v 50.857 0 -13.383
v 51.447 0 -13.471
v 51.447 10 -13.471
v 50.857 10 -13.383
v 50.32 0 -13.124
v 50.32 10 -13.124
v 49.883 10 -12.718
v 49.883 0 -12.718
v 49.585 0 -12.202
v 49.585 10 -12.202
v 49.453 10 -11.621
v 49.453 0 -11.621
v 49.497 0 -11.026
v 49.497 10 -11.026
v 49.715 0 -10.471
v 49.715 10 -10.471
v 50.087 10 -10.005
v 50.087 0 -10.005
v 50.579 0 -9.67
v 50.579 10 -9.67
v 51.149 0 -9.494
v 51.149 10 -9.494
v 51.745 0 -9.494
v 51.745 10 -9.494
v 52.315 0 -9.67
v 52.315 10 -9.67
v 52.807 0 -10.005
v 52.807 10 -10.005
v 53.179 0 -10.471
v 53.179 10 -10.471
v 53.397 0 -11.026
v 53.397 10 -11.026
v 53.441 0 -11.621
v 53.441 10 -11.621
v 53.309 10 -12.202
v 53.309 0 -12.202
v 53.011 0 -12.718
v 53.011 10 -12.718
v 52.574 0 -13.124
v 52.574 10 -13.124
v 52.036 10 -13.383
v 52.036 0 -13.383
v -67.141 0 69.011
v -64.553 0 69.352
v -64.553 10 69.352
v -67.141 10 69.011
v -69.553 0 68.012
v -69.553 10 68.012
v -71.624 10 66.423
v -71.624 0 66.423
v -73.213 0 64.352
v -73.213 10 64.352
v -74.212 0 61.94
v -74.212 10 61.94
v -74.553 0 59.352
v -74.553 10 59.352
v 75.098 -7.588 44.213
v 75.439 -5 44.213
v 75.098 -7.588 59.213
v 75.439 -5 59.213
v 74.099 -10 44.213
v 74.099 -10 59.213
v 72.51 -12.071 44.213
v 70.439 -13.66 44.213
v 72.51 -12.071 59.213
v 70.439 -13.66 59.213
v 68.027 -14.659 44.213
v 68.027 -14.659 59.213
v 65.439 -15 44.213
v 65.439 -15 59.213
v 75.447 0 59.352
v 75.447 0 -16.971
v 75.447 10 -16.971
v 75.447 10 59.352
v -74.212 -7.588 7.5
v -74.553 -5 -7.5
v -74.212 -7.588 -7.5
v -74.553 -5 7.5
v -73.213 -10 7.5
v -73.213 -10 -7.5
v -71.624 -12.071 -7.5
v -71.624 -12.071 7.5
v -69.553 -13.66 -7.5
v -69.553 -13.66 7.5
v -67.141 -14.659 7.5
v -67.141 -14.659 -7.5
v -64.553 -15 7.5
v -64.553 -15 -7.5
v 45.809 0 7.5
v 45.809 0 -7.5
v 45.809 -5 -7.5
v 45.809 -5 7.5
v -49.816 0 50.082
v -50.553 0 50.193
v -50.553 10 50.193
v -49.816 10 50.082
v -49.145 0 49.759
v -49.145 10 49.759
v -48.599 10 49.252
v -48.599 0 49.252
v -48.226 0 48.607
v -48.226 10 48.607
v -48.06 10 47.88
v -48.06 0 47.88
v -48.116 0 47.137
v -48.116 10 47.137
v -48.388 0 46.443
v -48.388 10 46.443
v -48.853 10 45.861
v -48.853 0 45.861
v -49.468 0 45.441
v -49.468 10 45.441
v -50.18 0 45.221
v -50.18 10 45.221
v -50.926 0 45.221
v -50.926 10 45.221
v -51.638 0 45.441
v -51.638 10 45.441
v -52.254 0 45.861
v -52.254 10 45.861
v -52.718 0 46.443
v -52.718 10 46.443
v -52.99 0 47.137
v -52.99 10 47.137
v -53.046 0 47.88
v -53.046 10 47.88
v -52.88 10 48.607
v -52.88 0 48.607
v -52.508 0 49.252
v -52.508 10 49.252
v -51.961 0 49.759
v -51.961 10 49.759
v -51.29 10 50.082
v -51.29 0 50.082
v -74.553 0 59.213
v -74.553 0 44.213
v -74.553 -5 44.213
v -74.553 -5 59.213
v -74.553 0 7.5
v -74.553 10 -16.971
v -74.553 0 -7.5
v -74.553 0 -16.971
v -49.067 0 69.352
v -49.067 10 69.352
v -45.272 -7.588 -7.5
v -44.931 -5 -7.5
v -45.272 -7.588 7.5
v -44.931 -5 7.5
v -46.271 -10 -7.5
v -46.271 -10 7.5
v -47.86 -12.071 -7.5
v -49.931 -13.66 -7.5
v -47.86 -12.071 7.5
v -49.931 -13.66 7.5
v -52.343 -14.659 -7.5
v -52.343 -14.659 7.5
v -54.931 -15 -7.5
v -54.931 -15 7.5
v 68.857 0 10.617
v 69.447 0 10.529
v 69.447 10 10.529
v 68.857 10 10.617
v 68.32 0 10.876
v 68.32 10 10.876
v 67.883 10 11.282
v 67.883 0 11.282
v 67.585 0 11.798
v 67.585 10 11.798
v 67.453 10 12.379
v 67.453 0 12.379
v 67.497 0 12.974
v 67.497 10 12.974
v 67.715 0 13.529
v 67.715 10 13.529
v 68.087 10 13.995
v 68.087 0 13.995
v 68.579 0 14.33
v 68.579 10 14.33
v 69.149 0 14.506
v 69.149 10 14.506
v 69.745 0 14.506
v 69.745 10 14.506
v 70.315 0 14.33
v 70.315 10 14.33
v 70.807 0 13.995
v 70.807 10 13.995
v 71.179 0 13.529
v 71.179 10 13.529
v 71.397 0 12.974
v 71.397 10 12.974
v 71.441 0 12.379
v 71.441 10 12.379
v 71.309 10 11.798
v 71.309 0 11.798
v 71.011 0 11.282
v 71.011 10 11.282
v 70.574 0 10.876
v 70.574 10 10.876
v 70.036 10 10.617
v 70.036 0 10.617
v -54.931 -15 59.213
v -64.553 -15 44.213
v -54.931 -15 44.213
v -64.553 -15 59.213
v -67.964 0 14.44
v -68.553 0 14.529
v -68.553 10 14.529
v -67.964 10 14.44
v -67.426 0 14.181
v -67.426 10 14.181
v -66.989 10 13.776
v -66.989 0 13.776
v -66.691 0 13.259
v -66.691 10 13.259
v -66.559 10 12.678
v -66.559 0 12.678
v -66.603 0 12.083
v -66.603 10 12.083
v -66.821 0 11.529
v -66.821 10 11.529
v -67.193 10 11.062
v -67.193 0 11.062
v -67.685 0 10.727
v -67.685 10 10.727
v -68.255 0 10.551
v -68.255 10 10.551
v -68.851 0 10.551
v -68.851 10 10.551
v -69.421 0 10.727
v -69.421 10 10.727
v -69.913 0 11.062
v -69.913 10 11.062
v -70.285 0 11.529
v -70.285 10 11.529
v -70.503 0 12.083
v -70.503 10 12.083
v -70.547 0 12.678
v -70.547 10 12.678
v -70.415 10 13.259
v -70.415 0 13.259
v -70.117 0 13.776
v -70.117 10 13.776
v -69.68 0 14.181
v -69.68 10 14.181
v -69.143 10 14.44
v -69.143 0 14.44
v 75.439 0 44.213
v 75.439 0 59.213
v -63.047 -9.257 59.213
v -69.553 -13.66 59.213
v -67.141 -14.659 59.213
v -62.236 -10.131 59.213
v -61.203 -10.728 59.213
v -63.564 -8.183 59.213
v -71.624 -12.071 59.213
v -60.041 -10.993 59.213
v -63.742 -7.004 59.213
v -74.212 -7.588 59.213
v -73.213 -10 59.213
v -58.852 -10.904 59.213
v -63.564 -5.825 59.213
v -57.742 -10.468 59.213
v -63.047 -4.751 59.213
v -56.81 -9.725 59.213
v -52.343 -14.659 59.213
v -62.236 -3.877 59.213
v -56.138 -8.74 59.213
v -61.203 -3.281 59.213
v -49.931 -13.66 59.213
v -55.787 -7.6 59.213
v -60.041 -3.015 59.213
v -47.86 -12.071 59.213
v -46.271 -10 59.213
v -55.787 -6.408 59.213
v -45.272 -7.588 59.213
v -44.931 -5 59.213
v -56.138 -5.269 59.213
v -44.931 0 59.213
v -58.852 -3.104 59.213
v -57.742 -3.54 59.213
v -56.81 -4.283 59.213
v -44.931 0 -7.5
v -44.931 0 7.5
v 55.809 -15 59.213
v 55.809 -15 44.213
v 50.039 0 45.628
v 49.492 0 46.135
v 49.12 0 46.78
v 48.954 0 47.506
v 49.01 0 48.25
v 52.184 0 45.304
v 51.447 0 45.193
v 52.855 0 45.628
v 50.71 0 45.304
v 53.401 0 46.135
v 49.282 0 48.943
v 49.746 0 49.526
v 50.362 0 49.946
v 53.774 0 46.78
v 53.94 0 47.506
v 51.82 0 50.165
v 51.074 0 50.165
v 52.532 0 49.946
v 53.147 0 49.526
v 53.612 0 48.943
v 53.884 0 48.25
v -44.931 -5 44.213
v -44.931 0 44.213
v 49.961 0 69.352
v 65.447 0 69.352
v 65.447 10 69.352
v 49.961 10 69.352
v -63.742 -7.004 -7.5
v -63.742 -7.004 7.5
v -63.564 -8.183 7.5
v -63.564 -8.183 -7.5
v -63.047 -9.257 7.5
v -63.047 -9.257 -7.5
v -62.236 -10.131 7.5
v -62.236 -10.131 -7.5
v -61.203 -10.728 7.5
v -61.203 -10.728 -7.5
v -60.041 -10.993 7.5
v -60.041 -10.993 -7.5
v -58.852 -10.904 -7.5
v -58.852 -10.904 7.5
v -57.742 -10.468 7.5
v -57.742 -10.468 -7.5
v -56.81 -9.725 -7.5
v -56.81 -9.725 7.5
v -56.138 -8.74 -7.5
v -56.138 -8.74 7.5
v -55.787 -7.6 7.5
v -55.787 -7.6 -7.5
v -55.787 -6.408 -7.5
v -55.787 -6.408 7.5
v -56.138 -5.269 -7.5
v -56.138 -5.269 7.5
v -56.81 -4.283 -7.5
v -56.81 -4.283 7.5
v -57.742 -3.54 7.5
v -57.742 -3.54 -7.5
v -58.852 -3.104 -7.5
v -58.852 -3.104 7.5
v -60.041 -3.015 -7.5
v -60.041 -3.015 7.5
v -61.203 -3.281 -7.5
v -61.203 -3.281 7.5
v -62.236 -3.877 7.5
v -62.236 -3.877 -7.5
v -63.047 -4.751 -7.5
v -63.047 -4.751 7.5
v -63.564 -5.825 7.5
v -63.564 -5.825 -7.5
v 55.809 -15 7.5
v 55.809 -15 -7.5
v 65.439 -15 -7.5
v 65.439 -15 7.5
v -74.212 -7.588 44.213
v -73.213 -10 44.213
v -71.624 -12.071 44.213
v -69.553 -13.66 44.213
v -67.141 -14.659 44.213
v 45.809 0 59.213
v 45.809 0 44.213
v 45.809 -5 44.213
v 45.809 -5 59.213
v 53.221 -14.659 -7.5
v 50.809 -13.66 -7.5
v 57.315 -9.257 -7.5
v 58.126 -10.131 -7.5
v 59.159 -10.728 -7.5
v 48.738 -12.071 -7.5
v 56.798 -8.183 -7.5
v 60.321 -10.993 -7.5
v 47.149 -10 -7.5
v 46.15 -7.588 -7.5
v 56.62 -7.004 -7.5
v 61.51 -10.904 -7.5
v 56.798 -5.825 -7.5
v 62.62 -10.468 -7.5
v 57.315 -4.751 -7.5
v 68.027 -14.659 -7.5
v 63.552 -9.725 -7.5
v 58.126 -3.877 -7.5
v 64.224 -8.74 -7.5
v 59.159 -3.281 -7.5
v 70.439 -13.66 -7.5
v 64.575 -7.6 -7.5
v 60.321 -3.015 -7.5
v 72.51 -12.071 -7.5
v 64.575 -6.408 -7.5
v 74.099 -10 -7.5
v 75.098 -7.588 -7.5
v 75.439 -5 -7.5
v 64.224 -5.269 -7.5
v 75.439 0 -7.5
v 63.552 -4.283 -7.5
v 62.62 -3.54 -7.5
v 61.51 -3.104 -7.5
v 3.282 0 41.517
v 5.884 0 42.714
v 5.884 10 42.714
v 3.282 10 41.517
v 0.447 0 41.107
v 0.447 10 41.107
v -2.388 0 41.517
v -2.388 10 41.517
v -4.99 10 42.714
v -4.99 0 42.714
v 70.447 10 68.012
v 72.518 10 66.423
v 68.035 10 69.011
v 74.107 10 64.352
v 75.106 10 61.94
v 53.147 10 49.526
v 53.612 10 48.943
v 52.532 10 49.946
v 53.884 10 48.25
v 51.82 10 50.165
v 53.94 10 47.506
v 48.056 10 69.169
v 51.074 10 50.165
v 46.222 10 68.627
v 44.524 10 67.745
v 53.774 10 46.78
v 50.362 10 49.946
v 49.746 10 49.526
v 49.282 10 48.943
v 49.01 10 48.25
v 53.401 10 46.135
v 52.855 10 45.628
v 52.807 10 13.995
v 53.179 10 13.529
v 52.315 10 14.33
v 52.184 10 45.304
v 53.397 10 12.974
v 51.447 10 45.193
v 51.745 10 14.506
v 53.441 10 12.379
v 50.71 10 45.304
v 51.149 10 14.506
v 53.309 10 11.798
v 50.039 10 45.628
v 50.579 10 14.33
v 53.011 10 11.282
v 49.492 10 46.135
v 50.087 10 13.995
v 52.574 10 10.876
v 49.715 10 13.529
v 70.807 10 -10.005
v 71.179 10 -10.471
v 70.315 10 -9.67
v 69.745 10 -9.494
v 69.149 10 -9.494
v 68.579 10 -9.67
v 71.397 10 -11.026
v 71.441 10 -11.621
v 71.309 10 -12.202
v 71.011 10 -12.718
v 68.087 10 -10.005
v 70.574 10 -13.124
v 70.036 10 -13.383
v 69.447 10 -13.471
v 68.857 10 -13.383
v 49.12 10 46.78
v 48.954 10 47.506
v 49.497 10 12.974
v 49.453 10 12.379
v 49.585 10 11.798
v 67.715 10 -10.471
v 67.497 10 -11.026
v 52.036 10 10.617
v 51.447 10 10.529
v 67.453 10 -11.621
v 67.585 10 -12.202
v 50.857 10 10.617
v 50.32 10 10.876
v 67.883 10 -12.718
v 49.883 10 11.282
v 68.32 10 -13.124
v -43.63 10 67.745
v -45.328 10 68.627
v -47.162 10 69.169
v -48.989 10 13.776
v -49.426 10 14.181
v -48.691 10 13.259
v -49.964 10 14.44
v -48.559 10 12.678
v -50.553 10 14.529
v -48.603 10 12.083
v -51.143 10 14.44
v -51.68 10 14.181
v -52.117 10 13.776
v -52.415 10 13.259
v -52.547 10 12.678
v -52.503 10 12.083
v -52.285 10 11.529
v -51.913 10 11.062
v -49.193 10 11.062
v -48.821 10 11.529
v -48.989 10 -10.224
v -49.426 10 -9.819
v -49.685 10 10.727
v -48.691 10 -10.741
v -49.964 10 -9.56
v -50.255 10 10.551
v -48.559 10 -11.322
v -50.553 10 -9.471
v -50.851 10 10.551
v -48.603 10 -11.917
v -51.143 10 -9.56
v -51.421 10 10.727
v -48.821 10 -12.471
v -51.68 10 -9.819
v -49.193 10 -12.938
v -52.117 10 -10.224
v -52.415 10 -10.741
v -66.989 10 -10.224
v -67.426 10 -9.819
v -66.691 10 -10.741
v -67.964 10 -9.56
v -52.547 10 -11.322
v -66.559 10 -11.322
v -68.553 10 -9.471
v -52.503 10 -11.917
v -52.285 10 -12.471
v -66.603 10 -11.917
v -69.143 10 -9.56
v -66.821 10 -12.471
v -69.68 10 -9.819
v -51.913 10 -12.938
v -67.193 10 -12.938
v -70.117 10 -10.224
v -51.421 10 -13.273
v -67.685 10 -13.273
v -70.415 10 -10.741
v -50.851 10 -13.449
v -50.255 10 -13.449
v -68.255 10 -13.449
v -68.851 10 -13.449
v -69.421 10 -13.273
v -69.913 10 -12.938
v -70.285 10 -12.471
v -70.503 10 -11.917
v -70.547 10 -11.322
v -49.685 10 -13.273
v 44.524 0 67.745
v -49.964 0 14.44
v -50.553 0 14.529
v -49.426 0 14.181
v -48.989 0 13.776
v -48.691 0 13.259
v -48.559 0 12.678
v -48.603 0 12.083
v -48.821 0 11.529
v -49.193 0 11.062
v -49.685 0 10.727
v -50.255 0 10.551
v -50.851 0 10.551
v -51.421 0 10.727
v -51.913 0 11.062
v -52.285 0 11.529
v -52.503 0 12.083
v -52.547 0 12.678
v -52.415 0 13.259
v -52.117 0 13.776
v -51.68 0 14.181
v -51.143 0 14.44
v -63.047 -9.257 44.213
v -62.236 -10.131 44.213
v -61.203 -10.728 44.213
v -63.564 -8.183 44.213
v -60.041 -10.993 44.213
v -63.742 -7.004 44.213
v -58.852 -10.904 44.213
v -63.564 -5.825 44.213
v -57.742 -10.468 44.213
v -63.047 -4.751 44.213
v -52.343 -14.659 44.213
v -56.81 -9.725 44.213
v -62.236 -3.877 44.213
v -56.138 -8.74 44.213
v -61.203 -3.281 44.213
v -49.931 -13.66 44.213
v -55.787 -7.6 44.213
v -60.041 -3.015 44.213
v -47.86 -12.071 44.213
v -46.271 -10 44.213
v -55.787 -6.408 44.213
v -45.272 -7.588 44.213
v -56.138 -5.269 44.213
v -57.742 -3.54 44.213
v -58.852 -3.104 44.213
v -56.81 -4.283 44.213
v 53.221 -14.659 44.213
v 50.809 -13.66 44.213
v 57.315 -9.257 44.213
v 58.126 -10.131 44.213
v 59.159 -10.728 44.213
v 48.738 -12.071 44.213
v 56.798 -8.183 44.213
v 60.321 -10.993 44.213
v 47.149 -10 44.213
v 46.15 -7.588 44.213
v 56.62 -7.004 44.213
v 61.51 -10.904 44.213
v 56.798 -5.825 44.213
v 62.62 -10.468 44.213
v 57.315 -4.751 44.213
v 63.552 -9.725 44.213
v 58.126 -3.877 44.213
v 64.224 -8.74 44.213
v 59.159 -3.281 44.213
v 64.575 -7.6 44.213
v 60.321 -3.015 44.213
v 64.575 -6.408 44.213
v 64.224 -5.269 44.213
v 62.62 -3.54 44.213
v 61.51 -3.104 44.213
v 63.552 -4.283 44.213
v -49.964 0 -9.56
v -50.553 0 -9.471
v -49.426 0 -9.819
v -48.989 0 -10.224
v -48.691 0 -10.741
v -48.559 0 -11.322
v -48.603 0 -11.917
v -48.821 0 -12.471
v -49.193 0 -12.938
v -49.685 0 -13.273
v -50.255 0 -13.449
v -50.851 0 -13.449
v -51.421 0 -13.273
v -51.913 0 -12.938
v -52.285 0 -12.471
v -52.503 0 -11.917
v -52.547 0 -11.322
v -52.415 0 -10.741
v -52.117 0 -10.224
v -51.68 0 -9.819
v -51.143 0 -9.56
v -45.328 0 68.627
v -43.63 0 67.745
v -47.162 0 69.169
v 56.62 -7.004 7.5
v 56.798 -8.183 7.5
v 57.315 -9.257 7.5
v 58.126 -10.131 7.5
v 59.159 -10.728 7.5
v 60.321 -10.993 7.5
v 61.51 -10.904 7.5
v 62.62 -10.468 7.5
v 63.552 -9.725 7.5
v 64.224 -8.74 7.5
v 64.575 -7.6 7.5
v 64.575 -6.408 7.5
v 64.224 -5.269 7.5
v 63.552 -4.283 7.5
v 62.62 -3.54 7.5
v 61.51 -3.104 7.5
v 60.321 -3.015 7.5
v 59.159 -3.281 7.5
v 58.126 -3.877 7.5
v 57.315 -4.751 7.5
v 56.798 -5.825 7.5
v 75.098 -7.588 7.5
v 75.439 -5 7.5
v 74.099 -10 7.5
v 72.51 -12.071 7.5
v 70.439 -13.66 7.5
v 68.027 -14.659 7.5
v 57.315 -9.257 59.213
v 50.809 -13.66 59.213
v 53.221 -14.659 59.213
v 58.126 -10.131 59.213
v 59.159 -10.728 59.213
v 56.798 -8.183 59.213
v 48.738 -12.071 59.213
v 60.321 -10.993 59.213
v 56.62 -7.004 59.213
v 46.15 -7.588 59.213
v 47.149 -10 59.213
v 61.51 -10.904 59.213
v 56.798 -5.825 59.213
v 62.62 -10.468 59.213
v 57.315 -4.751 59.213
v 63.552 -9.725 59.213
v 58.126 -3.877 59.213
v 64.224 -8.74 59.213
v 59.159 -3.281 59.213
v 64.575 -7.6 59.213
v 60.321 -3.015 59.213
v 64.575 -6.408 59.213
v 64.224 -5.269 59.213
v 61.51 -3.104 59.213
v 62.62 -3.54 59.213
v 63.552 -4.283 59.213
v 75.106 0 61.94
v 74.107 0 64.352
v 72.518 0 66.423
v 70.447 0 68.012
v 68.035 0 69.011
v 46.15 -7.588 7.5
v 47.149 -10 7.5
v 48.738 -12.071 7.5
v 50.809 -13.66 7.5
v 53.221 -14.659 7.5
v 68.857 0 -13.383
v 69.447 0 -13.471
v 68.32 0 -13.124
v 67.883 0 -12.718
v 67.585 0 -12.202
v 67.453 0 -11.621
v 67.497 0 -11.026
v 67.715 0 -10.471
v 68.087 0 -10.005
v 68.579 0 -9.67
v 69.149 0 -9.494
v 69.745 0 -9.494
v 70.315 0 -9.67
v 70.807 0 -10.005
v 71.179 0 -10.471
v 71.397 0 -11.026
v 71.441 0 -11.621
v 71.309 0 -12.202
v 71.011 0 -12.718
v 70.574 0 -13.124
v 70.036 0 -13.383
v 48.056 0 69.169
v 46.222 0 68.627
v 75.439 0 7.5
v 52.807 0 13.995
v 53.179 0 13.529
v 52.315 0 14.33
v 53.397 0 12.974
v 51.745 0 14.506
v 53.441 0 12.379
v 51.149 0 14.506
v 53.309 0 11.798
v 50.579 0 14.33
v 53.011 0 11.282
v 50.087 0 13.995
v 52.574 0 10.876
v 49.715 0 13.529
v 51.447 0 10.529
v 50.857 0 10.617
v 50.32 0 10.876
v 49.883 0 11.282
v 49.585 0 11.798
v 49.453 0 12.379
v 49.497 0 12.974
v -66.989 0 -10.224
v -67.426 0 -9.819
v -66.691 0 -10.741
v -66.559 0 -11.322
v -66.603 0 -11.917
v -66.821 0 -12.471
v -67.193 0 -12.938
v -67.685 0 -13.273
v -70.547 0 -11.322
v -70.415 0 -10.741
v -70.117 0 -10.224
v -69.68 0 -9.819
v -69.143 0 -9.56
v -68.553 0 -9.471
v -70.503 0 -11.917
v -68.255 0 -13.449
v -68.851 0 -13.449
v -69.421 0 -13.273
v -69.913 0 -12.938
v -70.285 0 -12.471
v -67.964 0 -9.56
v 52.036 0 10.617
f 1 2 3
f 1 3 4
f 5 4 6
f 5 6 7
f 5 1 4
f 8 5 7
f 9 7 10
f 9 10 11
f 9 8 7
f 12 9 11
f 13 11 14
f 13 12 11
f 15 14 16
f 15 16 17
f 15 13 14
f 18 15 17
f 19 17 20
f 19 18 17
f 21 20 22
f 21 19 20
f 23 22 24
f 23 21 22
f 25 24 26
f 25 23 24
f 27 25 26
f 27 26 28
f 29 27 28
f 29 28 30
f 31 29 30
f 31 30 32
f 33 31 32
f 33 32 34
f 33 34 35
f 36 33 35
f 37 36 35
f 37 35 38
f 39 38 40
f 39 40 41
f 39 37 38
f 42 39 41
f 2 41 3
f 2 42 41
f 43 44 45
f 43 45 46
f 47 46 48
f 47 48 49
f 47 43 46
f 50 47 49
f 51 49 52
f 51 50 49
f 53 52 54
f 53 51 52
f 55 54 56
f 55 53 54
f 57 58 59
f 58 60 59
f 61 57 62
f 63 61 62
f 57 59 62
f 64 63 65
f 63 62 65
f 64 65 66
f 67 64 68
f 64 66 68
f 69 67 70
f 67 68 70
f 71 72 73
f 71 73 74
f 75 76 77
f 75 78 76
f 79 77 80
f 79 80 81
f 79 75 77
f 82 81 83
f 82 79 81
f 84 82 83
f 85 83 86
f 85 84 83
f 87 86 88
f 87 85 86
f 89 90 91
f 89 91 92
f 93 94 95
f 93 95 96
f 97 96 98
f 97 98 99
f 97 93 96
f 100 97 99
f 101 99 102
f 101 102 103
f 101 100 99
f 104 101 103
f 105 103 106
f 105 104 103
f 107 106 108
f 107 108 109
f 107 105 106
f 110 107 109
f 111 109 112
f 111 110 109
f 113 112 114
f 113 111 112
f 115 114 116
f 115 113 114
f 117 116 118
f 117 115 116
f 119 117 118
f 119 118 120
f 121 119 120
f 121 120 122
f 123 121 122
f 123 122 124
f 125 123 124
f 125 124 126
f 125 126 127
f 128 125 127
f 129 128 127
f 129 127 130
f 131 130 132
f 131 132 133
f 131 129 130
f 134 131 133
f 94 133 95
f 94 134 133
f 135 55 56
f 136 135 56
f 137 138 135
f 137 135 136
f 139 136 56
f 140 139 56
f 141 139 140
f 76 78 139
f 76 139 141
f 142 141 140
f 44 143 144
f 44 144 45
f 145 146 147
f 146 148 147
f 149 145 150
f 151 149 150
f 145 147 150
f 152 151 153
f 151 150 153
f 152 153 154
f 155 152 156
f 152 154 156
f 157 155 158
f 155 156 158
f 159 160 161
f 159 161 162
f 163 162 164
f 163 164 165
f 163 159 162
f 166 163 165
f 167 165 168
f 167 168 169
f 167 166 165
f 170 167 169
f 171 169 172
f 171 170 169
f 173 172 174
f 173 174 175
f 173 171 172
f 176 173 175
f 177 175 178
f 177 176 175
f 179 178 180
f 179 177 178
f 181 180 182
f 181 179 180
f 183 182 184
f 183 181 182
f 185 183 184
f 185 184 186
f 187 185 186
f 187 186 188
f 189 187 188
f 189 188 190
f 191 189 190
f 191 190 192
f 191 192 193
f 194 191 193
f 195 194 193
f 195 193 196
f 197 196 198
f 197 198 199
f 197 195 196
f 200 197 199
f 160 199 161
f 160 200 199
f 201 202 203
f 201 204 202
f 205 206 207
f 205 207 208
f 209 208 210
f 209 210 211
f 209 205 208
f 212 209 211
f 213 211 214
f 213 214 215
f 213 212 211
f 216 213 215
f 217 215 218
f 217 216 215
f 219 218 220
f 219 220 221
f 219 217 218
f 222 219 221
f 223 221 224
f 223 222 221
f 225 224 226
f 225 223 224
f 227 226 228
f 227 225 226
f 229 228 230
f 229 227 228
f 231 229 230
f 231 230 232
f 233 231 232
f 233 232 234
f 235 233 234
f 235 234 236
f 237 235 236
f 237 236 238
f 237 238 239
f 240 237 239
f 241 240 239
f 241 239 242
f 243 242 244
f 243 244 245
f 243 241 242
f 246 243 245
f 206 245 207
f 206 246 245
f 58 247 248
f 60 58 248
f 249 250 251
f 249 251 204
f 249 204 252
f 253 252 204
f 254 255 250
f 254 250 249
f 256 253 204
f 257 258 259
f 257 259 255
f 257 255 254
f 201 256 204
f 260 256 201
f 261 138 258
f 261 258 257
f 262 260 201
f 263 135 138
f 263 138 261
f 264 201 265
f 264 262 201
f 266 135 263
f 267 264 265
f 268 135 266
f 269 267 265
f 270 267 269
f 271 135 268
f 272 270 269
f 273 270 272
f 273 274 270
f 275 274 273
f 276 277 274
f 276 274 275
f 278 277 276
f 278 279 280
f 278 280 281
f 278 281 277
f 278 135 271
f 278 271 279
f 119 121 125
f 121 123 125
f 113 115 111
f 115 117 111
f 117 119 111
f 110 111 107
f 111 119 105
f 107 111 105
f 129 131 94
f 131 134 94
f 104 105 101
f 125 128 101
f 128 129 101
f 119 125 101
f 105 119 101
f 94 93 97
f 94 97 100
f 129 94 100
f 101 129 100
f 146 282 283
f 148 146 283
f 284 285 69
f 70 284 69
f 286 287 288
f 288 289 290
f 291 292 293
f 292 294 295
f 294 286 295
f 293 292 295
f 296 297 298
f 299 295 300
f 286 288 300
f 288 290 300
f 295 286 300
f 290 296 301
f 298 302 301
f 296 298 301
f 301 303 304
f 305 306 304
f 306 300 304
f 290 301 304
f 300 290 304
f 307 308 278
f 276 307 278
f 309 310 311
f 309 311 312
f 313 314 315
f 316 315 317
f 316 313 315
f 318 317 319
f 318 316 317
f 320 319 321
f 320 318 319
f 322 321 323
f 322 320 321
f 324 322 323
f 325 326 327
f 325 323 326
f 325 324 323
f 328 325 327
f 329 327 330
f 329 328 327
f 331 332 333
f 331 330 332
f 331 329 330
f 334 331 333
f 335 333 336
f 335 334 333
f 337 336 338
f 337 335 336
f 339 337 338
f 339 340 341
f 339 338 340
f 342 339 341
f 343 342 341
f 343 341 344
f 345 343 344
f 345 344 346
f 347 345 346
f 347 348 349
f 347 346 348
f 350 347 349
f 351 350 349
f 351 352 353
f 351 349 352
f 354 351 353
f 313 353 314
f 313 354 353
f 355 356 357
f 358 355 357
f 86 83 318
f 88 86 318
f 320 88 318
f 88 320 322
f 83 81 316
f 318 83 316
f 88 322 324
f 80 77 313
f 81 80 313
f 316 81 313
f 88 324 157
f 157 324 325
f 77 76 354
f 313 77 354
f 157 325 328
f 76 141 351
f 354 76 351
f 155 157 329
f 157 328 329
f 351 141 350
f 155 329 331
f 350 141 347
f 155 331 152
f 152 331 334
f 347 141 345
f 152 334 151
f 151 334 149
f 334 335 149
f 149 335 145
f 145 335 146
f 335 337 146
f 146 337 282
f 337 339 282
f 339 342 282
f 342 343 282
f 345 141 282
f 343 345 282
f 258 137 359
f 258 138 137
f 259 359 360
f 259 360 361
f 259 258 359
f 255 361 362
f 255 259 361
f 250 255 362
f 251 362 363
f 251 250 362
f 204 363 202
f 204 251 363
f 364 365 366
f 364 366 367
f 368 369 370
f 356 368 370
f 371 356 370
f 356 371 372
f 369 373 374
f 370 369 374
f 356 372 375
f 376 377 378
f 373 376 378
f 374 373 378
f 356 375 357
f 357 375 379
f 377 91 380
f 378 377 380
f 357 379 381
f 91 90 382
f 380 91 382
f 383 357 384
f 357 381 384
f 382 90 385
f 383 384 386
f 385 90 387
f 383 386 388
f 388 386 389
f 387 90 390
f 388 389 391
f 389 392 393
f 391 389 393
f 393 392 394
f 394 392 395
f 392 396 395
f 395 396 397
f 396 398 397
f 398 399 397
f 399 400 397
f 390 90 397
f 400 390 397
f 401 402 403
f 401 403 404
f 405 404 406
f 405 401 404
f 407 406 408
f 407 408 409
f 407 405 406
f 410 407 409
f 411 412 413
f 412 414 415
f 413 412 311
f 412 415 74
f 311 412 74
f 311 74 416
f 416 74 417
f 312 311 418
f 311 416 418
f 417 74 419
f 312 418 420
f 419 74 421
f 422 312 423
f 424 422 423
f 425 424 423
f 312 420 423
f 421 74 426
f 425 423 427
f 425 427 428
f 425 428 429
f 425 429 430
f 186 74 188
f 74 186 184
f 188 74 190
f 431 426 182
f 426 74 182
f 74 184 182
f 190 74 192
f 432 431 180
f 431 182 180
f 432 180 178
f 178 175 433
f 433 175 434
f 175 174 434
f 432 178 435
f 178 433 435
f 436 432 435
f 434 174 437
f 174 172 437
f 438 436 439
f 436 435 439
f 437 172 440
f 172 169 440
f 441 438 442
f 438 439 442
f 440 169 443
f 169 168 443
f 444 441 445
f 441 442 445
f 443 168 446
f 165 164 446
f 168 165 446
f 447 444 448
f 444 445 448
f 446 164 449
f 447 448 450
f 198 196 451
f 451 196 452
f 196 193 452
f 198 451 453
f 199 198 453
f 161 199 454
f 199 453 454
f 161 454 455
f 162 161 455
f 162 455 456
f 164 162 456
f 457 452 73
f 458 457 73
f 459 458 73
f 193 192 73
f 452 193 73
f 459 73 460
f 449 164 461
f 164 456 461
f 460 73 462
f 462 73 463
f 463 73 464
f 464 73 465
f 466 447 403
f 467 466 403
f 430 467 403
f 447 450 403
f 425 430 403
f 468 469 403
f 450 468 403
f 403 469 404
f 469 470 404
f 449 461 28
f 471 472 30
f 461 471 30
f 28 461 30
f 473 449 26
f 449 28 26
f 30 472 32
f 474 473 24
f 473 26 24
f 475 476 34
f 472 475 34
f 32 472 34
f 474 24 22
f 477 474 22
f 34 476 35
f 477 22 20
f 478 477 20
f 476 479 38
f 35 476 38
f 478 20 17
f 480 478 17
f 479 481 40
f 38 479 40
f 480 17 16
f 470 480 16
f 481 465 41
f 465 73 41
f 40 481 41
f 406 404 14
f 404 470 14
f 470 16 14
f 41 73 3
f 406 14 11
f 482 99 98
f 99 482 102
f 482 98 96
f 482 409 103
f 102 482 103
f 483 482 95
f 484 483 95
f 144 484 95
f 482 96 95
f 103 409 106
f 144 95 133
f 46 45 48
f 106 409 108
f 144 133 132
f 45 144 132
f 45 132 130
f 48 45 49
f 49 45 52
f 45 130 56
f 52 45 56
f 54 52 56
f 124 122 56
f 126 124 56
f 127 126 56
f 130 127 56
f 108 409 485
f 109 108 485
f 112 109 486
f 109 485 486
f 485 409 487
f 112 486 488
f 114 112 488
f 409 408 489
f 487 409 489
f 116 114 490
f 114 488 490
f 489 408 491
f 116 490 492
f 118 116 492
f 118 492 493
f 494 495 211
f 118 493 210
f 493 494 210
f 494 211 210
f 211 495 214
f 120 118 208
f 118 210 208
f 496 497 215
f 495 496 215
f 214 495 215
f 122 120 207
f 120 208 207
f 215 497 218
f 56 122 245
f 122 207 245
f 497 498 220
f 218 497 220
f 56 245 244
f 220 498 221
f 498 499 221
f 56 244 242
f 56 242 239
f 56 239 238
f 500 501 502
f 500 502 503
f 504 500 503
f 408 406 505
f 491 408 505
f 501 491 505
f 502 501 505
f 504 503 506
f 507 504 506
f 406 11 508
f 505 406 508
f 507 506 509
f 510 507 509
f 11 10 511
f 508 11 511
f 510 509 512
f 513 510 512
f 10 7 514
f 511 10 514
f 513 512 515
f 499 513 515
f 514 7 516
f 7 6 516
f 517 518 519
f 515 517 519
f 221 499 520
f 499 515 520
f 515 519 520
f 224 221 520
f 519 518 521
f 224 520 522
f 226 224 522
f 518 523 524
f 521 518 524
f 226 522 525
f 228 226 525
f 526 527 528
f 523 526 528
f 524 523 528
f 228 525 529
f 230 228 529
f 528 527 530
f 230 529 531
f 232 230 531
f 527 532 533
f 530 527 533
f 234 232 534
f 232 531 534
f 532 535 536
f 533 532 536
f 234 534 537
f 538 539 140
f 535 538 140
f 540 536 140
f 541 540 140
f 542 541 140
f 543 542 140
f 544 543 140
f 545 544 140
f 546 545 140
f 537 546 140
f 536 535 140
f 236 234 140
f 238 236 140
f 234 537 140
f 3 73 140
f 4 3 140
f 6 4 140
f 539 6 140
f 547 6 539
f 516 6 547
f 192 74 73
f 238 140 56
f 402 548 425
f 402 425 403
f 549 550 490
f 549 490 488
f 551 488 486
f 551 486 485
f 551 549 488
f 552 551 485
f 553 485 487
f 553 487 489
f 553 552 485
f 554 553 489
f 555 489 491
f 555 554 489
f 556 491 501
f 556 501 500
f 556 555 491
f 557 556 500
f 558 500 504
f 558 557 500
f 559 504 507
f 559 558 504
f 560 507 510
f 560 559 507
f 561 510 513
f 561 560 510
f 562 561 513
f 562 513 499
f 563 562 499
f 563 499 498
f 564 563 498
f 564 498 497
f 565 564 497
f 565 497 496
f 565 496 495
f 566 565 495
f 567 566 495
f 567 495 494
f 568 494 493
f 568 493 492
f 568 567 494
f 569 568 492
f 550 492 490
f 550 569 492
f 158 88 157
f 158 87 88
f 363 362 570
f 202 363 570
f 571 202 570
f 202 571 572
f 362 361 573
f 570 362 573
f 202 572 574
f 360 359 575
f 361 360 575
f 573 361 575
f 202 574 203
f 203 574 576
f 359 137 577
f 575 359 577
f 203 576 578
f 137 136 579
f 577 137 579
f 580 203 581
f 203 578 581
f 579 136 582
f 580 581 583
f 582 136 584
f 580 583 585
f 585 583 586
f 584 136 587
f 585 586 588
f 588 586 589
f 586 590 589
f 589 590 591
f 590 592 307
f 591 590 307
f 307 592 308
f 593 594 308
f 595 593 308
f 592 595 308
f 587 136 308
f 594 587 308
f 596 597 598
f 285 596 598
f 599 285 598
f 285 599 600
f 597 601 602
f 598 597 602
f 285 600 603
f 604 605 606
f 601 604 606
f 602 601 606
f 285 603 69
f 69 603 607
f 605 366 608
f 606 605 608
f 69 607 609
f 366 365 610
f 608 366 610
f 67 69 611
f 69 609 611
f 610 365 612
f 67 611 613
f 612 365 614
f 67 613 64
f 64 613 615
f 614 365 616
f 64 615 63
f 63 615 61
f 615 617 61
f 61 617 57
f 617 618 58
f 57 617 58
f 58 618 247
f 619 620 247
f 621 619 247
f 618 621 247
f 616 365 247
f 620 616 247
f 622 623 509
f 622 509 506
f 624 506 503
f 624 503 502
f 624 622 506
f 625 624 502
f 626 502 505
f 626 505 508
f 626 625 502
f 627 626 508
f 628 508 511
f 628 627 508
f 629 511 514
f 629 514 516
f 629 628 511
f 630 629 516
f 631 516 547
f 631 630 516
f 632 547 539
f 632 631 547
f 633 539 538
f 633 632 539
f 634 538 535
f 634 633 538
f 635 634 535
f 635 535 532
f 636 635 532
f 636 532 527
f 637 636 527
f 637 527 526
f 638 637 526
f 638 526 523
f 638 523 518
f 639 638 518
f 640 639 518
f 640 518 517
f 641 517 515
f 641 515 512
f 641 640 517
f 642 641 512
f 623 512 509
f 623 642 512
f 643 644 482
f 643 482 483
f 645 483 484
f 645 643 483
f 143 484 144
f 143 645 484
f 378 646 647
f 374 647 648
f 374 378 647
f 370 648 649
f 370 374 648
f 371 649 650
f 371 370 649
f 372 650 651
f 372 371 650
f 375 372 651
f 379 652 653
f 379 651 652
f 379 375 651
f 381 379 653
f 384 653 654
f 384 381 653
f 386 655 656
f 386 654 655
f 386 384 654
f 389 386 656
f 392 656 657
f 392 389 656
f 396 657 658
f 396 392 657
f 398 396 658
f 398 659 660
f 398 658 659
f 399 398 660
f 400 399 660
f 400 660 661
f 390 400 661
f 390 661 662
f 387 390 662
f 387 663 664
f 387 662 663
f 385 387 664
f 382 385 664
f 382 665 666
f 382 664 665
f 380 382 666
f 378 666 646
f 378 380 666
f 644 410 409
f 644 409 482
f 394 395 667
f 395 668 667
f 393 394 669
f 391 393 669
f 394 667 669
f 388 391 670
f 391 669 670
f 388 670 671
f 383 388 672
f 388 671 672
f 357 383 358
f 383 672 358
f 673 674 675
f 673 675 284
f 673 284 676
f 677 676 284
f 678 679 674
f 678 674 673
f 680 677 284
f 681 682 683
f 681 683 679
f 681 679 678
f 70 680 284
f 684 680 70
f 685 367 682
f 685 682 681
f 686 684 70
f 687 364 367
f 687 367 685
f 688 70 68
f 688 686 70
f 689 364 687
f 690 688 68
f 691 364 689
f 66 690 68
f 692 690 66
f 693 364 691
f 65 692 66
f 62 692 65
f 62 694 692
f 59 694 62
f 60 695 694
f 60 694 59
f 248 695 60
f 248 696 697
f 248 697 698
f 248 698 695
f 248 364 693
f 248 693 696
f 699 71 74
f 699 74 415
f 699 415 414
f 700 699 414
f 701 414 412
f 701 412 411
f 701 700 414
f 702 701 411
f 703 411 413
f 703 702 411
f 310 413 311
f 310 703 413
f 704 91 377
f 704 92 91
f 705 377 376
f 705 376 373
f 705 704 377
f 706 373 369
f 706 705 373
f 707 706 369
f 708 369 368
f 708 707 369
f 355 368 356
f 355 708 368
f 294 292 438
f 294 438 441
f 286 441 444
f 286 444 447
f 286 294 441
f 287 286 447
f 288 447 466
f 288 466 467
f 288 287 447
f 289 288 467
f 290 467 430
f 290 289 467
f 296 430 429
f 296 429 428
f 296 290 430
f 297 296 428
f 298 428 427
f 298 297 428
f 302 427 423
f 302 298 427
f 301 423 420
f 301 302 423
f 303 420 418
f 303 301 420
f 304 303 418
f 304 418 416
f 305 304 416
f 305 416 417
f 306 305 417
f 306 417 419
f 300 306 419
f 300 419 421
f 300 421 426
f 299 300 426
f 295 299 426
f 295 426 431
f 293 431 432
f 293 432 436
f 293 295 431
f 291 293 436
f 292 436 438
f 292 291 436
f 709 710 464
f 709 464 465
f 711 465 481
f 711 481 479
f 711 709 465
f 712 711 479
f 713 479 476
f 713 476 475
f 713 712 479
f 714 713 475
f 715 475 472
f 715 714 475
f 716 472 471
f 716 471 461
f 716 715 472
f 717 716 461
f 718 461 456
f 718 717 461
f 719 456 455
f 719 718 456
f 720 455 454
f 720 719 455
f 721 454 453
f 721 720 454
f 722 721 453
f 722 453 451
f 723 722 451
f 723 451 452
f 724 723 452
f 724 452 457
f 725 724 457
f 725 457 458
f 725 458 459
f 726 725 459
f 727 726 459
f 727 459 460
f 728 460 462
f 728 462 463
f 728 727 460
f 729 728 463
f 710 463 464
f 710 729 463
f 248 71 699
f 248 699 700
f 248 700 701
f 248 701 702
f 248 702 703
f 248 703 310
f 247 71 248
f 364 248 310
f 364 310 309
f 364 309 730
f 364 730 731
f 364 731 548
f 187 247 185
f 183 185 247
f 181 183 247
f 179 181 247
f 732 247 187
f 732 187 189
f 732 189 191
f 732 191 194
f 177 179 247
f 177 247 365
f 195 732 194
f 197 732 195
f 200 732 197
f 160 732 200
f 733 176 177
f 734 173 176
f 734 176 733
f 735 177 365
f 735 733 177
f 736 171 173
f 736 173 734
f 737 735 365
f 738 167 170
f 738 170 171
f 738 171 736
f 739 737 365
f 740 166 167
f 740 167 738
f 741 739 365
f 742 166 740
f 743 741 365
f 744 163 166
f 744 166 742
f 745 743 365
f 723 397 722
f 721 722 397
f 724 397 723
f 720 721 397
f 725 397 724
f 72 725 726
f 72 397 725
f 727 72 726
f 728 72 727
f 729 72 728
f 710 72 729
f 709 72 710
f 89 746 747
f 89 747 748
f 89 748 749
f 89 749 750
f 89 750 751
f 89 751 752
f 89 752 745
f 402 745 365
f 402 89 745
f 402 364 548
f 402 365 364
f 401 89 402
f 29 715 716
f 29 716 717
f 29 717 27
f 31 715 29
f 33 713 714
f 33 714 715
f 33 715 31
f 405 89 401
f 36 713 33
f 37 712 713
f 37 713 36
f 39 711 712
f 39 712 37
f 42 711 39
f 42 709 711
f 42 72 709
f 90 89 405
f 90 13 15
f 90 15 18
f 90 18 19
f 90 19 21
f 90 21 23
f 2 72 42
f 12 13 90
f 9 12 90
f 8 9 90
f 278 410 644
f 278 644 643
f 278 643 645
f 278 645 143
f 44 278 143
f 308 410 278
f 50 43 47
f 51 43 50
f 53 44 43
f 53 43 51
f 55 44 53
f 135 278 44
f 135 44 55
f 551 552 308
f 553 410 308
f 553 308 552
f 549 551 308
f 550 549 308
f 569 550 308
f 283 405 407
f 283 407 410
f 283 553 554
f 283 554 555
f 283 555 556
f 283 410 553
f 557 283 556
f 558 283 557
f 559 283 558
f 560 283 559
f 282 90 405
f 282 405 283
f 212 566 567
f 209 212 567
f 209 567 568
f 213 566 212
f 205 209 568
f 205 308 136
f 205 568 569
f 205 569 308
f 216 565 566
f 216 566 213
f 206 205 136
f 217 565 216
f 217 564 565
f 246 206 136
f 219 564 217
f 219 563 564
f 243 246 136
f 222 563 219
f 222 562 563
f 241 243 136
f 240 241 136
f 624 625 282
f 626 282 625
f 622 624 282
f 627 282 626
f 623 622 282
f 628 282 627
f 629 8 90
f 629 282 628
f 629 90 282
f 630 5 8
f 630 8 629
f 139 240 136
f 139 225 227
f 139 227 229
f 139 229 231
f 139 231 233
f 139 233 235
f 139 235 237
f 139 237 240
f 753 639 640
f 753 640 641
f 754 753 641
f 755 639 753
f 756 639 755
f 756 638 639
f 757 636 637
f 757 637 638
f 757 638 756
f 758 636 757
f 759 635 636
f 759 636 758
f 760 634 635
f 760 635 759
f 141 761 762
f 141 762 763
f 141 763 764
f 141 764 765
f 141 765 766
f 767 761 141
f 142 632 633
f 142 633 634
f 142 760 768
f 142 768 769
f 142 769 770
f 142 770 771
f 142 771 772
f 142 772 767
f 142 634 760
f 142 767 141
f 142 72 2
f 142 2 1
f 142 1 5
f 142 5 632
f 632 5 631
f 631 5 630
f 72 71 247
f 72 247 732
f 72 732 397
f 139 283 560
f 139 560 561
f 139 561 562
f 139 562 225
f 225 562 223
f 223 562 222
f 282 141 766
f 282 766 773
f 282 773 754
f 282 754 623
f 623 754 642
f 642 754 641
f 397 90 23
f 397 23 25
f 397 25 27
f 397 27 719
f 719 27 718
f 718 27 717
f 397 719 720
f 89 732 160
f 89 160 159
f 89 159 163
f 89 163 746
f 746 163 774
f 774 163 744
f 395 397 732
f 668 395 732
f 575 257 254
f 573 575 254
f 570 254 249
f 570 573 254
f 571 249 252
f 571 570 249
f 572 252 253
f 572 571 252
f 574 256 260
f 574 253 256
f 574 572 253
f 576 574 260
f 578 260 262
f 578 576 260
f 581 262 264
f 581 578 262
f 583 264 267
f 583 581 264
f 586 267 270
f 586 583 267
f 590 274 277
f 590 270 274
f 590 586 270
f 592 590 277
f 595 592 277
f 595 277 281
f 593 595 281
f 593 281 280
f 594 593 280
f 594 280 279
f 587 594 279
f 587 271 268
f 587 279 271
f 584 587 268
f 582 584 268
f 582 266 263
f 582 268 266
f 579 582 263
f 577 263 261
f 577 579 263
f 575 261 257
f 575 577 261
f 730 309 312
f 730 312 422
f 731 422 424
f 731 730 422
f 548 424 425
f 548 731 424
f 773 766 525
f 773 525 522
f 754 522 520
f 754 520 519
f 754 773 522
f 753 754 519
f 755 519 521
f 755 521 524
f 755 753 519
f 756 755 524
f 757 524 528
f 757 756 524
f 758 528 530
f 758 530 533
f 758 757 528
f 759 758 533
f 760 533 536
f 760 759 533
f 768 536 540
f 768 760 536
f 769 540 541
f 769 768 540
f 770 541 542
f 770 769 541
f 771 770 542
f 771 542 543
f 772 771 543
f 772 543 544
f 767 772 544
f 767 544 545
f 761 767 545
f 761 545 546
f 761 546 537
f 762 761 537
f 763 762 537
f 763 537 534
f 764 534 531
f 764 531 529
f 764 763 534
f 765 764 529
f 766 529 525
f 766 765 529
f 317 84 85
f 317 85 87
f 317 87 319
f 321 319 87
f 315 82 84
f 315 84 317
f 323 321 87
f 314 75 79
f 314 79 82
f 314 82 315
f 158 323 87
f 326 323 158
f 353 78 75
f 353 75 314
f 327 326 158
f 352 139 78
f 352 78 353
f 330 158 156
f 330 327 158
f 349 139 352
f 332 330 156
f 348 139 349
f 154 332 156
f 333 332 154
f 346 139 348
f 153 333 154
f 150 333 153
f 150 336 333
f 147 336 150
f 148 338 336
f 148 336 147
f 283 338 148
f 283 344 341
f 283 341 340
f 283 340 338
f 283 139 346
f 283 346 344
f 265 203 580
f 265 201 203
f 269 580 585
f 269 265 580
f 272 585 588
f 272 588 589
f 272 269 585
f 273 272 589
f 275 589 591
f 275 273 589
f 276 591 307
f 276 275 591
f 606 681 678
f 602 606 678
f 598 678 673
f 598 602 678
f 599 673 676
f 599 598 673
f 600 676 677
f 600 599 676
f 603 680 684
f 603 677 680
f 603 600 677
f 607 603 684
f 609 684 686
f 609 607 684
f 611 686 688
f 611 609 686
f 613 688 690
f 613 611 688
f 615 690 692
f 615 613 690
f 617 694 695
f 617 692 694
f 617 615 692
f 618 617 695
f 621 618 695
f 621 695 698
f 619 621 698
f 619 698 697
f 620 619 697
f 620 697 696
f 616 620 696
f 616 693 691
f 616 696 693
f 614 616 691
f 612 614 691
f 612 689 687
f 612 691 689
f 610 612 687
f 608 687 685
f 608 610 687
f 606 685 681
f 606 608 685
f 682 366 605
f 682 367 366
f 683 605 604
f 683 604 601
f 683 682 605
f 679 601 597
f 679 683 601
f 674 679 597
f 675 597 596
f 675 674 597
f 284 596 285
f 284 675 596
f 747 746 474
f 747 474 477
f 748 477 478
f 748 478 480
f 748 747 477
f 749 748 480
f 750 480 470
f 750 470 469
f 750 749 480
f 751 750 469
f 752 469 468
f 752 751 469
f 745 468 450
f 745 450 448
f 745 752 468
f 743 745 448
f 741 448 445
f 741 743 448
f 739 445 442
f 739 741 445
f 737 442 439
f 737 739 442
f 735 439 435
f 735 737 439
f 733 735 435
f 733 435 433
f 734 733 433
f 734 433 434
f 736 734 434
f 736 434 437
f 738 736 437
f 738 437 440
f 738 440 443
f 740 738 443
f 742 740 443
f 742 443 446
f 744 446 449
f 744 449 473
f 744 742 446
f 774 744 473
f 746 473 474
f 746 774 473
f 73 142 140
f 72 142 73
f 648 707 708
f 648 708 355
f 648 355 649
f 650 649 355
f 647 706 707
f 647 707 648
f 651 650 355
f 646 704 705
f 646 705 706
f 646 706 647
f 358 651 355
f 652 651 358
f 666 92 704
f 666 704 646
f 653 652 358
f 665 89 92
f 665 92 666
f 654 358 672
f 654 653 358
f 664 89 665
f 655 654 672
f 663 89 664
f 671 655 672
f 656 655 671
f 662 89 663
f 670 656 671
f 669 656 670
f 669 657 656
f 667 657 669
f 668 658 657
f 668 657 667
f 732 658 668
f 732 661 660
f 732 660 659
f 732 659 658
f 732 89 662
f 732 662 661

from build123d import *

# Parameters (mm, degrees)
SKETCH3_R               = 2
SKETCH3_R_2             = 2.5
BOSS_EXTRUDE3_DEPTH     = 10
SKETCH4_W               = 29.621982307
SKETCH4_H               = 15
SKETCH4_W_2             = 29.629902686
BOSS_EXTRUDE4_DEPTH     = 15
FILLET1_R               = 10
CUT_EXTRUDE1_DEPTH      = 57
CUT_EXTRUDE1_DEPTH_BACK = 15
SKETCH5_R               = 4
FILLET3_R               = 10


with BuildPart() as part:
    # Sketch3 → Boss-Extrude3 (new body)
    with BuildSketch(Plane(origin=(0, 0, 0), x_dir=(1, 0, 0), z_dir=(0, 1, 0))):
        with BuildLine():
            Line((-74.553080605, -18.028525235), (-74.553080605, 16.971474765))
            Line((-74.553080605, 16.971474765), (75.446919395, 16.971474765))
            Line((75.446919395, 16.971474765), (75.446919395, -18.028525235))
            Line((75.446919395, -18.028525235), (75.446919395, -59.351917417))
            ThreePointArc((75.446919395, -59.351917417), (72.517987207, -66.422985229), (65.446919395, -69.351917417))
            Line((65.446919395, -69.351917417), (49.960719272, -69.351917417))
            ThreePointArc((49.960719272, -69.351917417), (47.125982353, -68.941717551), (44.523807175, -67.744770737))
            Line((44.523807175, -67.744770737), (5.883831491, -42.713694512))
            ThreePointArc((5.883831491, -42.713694512), (0.446919395, -41.106547832), (-4.989992702, -42.713694512))
            Line((-4.989992702, -42.713694512), (-43.629968386, -67.744770737))
            ThreePointArc((-43.629968386, -67.744770737), (-46.232143563, -68.941717551), (-49.066880482, -69.351917417))
            Line((-49.066880482, -69.351917417), (-64.553080605, -69.351917417))
            ThreePointArc((-64.553080605, -69.351917417), (-71.624148417, -66.422985229), (-74.553080605, -59.351917417))
            Line((-74.553080605, -59.351917417), (-74.553080605, -18.028525235))
        make_face()
        with Locations(Location((-68.553080605, 11.471474765, 0), (0, 0, 270))):
            Circle(SKETCH3_R, mode=Mode.SUBTRACT)
        with Locations(Location((-50.553080605, 11.471474765, 0), (0, 0, 270))):
            Circle(SKETCH3_R, mode=Mode.SUBTRACT)
        with Locations(Location((-68.553080605, -12.528525235, 0), (0, 0, 270))):
            Circle(SKETCH3_R, mode=Mode.SUBTRACT)
        with Locations(Location((-50.553080605, -12.528525235, 0), (0, 0, 270))):
            Circle(SKETCH3_R, mode=Mode.SUBTRACT)
        with Locations(Location((51.446919395, -12.528525235, 0), (0, 0, 90))):
            Circle(SKETCH3_R, mode=Mode.SUBTRACT)
        with Locations(Location((69.446919395, -12.528525235, 0), (0, 0, 90))):
            Circle(SKETCH3_R, mode=Mode.SUBTRACT)
        with Locations(Location((69.446919395, 11.471474765, 0), (0, 0, 90))):
            Circle(SKETCH3_R, mode=Mode.SUBTRACT)
        with Locations(Location((51.446919395, 11.471474765, 0), (0, 0, 90))):
            Circle(SKETCH3_R, mode=Mode.SUBTRACT)
        with Locations(Location((-50.553080605, -47.693315976, 0), (0, 0, 270))):
            Circle(SKETCH3_R_2, mode=Mode.SUBTRACT)
        with Locations(Location((51.446919395, -47.693315976, 0), (0, 0, 90))):
            Circle(SKETCH3_R_2, mode=Mode.SUBTRACT)
    extrude(amount=BOSS_EXTRUDE3_DEPTH)

    # Sketch4 → Boss-Extrude4 (add)
    with BuildSketch(Plane.XZ):
        with Locations((-59.742089452, 0)):
            Rectangle(SKETCH4_W, SKETCH4_H)
        with Locations((60.624047673, 0)):
            Rectangle(SKETCH4_W_2, SKETCH4_H)
        with Locations((60.624047673, 51.713197214)):
            Rectangle(SKETCH4_W_2, SKETCH4_H)
        with Locations((-59.742089452, 51.713197214)):
            Rectangle(SKETCH4_W, SKETCH4_H)
    extrude(amount=BOSS_EXTRUDE4_DEPTH)

    # Fillet1
    fillet1_edges = [part.edges().sort_by_distance(p)[0] for p in [
        (-44.931098298, -15, 0),
        (-74.553080605, -15, 0),
        (75.438999016, -15, 0),
        (45.80909633, -15, 0),
    ]]
    fillet(fillet1_edges, radius=FILLET1_R)

    # Sketch5 → Cut-Extrude1 (cut, two sides: drawn at the far end of the back side and taken through both)
    with BuildSketch(Plane.XY.offset(7.5).offset(-CUT_EXTRUDE1_DEPTH_BACK)):
        with Locations(Location((-59.742089451, -7.004049179, 0), (0, 0, 180))):
            Circle(SKETCH5_R)
        with Locations(Location((60.620087484, -7.004049179, 0), (0, 0, 180))):
            Circle(SKETCH5_R)
    extrude(amount=CUT_EXTRUDE1_DEPTH + CUT_EXTRUDE1_DEPTH_BACK, mode=Mode.SUBTRACT)

    # Fillet3
    fillet3_edges = [part.edges().sort_by_distance(p)[0] for p in [
        (45.80909633, -15, 51.713197214),
        (75.438999016, -15, 51.713197214),
        (-74.553080605, -15, 51.713197214),
        (-44.931098298, -15, 51.713197214),
    ]]
    fillet(fillet3_edges, radius=FILLET3_R)


solid = part.part
